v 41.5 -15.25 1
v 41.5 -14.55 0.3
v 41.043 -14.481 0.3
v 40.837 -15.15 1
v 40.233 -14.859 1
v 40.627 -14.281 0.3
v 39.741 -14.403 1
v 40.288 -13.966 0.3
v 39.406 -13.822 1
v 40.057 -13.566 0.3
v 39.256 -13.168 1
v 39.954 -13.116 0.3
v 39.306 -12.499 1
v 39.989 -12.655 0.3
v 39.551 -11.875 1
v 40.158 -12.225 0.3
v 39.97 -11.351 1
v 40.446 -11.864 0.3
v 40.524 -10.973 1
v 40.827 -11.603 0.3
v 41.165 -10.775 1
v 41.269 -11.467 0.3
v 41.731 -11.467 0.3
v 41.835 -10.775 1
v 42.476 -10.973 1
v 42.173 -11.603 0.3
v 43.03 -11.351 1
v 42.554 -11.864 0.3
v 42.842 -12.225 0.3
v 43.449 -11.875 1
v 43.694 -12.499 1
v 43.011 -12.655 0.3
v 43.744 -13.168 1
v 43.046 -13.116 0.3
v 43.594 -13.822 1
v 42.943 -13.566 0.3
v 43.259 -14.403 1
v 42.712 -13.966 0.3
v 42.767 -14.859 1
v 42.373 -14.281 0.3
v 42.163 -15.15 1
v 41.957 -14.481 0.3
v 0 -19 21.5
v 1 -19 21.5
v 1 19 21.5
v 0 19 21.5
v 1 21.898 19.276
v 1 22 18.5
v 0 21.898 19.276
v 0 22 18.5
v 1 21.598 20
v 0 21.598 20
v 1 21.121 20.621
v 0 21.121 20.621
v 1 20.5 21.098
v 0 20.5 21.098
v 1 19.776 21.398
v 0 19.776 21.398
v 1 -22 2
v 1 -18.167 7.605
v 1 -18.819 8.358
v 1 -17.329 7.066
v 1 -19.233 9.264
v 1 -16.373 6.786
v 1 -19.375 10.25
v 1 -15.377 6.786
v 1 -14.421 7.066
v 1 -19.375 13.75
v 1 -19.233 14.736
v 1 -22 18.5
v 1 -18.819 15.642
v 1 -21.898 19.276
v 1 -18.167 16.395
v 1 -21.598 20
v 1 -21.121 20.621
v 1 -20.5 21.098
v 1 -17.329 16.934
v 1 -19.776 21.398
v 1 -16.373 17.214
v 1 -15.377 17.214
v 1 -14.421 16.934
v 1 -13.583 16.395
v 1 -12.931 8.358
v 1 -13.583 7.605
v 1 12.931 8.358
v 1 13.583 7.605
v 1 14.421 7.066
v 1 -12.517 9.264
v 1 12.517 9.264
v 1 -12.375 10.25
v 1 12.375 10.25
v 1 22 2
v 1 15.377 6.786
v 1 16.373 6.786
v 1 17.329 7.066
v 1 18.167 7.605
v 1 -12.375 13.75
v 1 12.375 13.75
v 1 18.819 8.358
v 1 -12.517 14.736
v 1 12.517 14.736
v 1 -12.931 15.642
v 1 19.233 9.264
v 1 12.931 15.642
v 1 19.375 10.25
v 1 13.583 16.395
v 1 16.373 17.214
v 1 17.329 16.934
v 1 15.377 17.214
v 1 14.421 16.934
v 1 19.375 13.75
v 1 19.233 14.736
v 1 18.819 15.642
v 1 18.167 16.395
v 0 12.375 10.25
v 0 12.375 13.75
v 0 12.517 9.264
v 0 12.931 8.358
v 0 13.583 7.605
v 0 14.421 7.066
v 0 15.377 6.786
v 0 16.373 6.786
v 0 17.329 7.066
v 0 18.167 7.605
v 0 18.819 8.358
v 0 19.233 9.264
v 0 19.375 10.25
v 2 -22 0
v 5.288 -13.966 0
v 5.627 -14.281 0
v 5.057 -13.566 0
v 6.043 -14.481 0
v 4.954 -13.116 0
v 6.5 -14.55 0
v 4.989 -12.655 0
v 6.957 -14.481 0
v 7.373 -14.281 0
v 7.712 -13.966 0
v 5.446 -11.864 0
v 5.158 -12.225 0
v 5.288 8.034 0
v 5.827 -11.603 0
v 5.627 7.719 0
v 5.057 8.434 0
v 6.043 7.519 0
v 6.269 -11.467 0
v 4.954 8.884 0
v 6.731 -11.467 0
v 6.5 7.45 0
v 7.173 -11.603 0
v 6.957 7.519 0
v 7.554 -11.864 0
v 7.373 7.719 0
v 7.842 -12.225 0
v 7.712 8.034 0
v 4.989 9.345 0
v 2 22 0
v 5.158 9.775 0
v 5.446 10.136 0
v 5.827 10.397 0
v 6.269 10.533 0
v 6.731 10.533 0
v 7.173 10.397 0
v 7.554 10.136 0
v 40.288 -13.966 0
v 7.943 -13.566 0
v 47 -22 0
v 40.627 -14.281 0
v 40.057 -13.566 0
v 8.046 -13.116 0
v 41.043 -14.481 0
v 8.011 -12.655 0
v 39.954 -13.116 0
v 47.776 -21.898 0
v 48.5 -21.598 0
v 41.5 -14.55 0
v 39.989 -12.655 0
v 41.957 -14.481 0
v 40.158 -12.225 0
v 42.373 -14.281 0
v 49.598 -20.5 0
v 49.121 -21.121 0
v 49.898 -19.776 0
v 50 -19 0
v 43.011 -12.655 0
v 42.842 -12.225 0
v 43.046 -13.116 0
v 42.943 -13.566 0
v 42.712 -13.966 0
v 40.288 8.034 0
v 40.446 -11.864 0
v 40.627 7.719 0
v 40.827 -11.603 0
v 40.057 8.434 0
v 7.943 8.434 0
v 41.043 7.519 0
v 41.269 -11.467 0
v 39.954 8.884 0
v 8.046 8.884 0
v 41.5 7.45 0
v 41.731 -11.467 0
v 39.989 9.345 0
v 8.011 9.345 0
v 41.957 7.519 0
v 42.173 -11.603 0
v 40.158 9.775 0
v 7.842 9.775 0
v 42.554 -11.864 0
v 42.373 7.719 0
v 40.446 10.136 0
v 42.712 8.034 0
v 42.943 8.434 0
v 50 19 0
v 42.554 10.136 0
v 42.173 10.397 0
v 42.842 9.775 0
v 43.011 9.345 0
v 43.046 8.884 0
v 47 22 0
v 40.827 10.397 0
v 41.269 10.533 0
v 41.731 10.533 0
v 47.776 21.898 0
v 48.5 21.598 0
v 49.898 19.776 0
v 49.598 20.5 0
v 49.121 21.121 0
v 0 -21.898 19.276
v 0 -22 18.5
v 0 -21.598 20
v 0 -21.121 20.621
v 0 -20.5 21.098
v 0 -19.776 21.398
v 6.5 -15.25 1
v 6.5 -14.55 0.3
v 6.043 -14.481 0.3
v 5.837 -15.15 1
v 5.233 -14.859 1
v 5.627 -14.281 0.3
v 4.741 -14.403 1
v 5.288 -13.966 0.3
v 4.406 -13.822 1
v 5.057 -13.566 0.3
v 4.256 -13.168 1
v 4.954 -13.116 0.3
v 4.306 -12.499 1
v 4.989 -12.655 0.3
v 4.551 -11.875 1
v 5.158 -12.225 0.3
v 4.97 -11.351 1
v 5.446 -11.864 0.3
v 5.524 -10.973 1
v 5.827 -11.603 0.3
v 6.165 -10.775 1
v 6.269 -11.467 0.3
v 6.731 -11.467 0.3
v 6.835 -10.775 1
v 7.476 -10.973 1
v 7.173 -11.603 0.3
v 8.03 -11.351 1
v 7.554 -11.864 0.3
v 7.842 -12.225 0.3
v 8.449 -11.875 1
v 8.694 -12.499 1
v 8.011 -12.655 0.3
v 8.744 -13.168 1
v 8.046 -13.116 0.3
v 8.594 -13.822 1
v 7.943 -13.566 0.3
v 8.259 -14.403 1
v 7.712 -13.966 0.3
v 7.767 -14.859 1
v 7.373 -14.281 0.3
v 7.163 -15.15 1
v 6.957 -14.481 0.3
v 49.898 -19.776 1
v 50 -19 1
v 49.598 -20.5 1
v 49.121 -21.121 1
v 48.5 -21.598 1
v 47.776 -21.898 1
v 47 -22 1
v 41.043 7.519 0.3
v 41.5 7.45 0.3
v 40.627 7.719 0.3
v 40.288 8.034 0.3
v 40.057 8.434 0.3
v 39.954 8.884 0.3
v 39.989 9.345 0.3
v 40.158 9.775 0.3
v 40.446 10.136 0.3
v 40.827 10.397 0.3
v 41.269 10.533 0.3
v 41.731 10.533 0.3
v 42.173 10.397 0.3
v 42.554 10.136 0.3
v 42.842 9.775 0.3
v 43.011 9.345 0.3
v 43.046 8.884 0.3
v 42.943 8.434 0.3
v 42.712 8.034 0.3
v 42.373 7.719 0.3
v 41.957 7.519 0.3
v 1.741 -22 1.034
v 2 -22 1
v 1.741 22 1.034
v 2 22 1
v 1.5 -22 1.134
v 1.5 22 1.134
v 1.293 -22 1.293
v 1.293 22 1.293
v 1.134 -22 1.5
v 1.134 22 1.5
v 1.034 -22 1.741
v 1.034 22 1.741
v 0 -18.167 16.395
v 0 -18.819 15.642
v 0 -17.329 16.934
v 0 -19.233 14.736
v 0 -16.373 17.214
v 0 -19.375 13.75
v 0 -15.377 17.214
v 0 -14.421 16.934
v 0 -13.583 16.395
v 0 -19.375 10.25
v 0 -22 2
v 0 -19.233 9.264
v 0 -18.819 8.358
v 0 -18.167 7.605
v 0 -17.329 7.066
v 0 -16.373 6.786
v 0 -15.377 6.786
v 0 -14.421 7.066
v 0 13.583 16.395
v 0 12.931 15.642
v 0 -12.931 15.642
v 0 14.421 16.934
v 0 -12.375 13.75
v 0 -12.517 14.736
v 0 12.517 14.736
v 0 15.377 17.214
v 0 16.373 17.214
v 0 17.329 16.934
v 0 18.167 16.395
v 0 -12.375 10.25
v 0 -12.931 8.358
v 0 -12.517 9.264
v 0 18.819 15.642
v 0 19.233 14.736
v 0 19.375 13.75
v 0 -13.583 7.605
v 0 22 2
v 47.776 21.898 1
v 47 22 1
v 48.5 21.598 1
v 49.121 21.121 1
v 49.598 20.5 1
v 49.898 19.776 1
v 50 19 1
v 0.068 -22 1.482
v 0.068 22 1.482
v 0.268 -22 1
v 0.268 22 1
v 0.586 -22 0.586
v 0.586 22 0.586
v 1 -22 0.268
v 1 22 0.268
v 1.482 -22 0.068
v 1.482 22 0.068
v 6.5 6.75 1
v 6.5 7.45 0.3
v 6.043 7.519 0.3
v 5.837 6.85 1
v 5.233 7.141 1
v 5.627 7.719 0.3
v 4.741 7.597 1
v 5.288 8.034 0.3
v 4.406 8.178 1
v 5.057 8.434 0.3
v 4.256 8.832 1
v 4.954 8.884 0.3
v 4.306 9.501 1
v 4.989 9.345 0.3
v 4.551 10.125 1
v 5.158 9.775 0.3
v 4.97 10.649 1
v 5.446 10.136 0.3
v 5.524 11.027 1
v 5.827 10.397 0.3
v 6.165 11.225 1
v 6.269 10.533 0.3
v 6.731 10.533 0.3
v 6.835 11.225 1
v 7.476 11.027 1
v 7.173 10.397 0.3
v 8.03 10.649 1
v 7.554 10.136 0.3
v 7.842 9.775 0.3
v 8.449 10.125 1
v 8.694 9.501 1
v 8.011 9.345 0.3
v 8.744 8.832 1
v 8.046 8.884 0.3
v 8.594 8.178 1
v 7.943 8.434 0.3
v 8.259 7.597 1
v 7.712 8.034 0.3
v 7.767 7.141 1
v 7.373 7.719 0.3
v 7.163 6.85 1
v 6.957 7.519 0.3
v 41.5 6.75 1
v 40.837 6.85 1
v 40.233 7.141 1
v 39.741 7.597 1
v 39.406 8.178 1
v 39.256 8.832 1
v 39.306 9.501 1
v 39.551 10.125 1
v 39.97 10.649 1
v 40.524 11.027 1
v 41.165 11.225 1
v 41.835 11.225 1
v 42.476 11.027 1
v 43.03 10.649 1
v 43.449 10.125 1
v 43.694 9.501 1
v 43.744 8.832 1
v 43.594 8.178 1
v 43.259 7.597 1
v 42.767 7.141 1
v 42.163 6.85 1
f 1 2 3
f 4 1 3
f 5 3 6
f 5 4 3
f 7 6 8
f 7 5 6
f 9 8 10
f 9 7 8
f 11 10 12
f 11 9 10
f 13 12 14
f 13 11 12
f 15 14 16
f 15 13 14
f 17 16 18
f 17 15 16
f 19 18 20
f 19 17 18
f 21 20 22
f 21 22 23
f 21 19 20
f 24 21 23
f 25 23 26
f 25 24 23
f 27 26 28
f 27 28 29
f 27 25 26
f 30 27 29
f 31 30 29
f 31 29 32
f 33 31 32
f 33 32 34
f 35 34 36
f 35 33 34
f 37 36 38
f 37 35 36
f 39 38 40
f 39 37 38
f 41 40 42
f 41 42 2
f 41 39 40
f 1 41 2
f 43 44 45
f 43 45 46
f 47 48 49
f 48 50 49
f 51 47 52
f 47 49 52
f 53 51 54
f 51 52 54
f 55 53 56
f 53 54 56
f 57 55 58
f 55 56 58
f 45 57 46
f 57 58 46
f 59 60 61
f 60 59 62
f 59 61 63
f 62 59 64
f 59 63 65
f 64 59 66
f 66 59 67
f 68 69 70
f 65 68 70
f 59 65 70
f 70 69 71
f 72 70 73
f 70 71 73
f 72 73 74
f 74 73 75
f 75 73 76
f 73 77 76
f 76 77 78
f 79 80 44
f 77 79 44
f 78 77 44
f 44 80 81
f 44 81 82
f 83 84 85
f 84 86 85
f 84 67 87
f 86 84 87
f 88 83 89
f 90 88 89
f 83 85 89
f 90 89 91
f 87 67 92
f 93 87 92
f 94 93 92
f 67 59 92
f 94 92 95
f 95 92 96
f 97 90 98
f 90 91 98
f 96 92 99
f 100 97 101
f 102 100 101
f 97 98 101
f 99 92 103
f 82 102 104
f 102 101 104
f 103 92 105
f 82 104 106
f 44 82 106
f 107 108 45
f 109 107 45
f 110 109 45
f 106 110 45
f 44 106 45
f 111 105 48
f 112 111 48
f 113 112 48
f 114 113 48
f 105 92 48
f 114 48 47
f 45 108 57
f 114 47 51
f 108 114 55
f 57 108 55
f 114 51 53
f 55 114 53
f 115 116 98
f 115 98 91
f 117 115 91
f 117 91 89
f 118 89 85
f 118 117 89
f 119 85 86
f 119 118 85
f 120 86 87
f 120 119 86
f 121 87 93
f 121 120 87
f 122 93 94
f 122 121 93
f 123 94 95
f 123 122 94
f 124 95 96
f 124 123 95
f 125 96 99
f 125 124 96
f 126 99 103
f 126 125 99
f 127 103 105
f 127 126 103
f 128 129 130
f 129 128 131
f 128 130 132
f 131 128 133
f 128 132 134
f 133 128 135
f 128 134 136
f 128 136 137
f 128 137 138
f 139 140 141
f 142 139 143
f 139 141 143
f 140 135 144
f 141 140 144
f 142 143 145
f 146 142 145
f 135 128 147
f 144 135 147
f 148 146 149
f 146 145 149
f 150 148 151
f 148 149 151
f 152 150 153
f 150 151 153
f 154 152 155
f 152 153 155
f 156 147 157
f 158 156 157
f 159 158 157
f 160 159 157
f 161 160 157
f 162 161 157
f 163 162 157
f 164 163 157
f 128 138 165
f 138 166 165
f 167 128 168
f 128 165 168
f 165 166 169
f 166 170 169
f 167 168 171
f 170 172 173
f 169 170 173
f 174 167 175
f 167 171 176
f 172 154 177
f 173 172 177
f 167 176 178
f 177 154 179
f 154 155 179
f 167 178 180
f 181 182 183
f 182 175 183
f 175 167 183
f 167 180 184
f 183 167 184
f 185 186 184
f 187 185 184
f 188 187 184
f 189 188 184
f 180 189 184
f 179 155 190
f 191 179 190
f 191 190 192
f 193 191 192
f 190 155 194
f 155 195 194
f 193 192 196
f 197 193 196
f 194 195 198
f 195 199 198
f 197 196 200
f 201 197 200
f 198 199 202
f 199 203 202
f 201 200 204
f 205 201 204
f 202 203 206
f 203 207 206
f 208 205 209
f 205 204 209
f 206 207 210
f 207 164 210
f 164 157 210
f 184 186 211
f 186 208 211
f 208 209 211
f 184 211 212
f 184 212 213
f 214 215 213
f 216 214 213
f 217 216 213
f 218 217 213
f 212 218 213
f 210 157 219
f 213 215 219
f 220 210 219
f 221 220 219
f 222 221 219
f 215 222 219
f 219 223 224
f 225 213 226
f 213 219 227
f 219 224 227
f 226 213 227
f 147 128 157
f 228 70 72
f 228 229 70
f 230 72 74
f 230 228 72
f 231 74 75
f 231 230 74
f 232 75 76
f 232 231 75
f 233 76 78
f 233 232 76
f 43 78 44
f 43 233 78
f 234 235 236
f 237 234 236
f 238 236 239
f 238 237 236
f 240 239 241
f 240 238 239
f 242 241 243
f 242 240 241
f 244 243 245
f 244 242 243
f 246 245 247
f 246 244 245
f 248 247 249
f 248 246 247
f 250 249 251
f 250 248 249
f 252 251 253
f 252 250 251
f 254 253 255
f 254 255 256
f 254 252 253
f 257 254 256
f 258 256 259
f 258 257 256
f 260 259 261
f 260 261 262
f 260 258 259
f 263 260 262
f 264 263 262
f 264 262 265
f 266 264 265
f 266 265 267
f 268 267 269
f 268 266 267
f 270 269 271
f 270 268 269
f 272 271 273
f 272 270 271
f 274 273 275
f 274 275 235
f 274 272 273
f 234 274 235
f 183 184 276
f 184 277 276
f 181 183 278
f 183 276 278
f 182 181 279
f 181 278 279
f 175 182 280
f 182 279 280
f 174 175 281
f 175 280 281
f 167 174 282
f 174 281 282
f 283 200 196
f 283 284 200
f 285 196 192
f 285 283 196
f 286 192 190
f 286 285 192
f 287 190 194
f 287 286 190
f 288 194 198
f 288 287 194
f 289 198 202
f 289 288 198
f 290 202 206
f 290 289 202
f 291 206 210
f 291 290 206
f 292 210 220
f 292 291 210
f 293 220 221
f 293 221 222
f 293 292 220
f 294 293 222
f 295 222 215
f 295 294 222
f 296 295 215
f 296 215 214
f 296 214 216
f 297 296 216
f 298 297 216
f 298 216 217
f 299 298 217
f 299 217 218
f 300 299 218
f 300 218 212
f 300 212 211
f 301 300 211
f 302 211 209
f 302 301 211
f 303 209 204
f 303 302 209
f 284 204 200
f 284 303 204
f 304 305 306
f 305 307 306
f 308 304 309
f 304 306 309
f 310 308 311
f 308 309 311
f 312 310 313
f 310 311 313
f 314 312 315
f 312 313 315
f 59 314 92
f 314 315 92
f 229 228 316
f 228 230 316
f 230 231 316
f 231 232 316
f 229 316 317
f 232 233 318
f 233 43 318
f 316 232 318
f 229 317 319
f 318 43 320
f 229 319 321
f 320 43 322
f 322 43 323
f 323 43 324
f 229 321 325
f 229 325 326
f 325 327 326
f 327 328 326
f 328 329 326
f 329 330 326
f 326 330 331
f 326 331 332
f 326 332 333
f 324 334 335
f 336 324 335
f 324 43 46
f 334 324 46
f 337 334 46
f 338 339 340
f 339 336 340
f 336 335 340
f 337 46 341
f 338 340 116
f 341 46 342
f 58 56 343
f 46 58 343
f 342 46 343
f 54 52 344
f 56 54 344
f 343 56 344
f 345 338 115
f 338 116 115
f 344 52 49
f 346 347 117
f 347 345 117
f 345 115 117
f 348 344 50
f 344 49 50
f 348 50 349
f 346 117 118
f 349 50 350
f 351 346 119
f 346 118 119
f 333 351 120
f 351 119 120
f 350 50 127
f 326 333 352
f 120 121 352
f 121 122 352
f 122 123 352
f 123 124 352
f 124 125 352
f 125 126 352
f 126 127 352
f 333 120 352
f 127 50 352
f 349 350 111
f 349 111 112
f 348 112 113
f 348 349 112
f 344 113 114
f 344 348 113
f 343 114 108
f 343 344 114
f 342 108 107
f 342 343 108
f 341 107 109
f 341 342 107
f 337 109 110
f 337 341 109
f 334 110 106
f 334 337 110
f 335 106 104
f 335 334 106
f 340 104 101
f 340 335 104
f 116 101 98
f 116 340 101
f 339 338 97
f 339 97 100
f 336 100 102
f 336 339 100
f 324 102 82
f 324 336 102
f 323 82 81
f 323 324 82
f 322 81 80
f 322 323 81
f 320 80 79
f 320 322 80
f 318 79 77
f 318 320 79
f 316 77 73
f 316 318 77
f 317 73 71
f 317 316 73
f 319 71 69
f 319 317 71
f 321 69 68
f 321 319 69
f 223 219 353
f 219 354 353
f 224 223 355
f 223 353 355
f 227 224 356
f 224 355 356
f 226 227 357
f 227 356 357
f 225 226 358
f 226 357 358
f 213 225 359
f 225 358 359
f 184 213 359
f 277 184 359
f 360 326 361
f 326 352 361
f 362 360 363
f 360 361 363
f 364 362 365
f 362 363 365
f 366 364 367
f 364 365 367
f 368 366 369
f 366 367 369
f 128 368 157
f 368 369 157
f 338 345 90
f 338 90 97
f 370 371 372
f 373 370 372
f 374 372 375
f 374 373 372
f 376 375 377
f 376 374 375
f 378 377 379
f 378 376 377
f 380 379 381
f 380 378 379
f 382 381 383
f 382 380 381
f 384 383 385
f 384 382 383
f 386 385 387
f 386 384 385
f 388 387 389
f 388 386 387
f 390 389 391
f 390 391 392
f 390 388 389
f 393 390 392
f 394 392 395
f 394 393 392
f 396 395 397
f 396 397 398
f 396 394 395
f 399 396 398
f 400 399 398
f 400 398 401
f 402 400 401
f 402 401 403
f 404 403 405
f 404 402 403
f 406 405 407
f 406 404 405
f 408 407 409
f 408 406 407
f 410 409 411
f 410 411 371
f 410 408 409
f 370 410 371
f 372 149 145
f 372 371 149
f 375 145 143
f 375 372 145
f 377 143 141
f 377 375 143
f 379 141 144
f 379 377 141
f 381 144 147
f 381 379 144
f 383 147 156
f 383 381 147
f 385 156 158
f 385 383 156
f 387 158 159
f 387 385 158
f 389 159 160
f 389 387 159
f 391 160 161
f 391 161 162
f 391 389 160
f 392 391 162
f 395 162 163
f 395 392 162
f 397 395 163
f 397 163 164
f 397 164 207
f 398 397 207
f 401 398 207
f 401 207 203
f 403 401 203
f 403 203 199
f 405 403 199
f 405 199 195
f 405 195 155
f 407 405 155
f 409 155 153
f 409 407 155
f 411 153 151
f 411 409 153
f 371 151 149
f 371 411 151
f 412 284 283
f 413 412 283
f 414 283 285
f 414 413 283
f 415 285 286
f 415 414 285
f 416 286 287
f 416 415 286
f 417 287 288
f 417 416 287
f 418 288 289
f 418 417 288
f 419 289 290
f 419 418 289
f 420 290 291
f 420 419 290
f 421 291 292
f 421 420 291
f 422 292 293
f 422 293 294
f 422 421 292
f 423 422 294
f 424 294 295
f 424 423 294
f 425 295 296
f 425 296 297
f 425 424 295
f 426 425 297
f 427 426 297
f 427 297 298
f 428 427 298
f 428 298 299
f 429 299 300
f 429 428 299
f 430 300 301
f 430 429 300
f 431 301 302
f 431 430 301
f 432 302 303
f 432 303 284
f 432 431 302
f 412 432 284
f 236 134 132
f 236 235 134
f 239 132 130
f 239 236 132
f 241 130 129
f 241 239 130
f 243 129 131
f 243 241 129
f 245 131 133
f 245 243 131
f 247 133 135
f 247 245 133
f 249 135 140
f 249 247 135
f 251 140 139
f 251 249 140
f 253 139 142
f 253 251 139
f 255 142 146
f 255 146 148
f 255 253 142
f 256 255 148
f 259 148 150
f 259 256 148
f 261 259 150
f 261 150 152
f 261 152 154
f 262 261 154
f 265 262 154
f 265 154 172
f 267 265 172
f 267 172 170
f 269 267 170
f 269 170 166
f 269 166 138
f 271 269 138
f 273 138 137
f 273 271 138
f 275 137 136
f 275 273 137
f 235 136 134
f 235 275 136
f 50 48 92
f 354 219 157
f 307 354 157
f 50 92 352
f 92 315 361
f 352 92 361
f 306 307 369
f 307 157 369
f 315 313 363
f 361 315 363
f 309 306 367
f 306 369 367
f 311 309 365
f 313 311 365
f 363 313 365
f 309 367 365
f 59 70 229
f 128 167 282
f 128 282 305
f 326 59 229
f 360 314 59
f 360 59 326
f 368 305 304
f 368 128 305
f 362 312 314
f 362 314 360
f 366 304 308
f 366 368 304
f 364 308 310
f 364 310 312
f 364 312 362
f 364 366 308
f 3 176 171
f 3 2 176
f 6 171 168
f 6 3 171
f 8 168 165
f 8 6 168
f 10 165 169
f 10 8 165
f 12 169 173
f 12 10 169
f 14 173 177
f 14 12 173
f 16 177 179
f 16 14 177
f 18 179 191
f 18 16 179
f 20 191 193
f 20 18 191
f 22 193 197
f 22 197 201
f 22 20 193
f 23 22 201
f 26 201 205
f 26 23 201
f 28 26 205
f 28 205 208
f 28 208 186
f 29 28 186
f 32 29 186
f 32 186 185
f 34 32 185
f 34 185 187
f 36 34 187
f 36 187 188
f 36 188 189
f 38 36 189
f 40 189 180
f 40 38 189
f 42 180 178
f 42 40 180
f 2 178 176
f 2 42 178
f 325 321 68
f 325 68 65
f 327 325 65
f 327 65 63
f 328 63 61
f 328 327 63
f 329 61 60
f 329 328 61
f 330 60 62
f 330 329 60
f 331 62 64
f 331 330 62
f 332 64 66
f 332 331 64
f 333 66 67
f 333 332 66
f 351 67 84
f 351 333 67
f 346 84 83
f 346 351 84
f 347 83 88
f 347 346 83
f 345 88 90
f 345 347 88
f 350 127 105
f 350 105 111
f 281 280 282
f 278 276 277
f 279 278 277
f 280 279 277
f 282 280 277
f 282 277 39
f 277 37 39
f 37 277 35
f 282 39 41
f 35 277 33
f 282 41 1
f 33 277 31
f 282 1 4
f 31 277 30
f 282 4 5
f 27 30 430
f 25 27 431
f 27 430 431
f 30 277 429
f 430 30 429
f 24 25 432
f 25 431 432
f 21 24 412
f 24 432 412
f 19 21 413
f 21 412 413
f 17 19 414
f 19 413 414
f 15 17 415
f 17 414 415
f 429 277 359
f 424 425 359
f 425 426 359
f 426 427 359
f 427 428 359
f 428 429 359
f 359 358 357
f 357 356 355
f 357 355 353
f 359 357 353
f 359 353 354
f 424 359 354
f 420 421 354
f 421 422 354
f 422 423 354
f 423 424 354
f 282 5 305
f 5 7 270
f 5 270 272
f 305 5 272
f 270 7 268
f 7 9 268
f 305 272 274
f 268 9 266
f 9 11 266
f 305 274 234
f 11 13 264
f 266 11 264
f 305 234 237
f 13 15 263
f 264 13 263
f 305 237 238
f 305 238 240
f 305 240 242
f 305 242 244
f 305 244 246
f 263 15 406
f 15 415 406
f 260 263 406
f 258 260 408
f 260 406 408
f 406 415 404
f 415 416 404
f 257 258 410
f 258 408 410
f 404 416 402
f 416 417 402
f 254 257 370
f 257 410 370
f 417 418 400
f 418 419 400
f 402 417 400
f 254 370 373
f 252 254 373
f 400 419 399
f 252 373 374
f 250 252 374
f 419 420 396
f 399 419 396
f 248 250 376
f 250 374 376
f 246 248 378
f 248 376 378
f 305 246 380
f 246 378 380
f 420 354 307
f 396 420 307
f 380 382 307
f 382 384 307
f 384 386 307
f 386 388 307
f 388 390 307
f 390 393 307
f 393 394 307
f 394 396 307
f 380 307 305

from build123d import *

# Parameters (mm, degrees)
SM_BASE_FLANGE_1_DEPTH           = 22
FILLET_1_R                       = 3
HOLE_WIZARD_6_8_6_8_1_DEPTH      = 1
HOLE_WIZARD_3_1_3_1_1_AT_2_COUNT = 2
HOLE_WIZARD_3_1_3_1_1_AT_2_PITCH = 41.340053217
HOLE_WIZARD_3_1_3_1_1_AT_3_COUNT = 2
HOLE_WIZARD_3_1_3_1_1_AT_3_PITCH = 22
HOLE_WIZARD_3_1_3_1_1_AT_4_COUNT = 2
HOLE_WIZARD_3_1_3_1_1_AT_4_PITCH = 35


# Read off the part's stored shape, not the designer's step: Диаметр отверстия Ø6.8 (6.8)1
# Sheet-metal steps are written as plain solids
with BuildPart() as part:
    # Sketch 1 → Базовая кромка1 (new, symmetric)
    with BuildSketch(Plane(origin=(0, 0, 0), x_dir=(1, 0, 0), z_dir=(0, 1, 0))):
        with BuildLine():
            Line((0, -21.5), (0, -2))
            ThreePointArc((0, -2), (0.585786438, -0.585786438), (2, 0))
            Line((2, 0), (50, 0))
            Line((50, 0), (50, -1))
            Line((50, -1), (2, -1))
            ThreePointArc((2, -1), (1.292893219, -1.292893219), (1, -2))
            Line((1, -2), (1, -21.5))
            Line((1, -21.5), (0, -21.5))
        make_face()
    extrude(amount=SM_BASE_FLANGE_1_DEPTH, both=True)

    # Скругление1
    fillet_1_edges = [part.edges().sort_by_distance(p)[0] for p in [
        (0.5, 22, 21.5),
        (0.5, -22, 21.5),
        (50, 22, 0.5),
        (50, -22, 0.5),
    ]]
    fillet(fillet_1_edges, radius=FILLET_1_R)

    # Диаметр отверстия Ø6.8 (6.8)1 outline → Диаметр отверстия Ø6.8 (6.8)1 (cut)
    with BuildSketch(Plane.YZ):
        with BuildLine():
            Line((-12.375, 10.25), (-12.375, 13.75))
            ThreePointArc((-12.375, 13.75), (-15.875, 17.25), (-19.375, 13.75))
            Line((-19.375, 13.75), (-19.375, 10.25))
            ThreePointArc((-19.375, 10.25), (-15.875, 6.75), (-12.375, 10.25))
        make_face()
        with BuildLine():
            ThreePointArc((19.375, 13.75), (15.875, 17.25), (12.375, 13.75))
            Line((12.375, 13.75), (12.375, 10.25))
            ThreePointArc((12.375, 10.25), (15.875, 6.75), (19.375, 10.25))
            Line((19.375, 10.25), (19.375, 13.75))
        make_face()
    extrude(amount=HOLE_WIZARD_6_8_6_8_1_DEPTH, mode=Mode.SUBTRACT)

    # Эскиз5 → Диаметр отверстия Ø3.1 (3.1)1 (revolve, cut)
    with BuildSketch(Plane(origin=(6.5, 9, 1), x_dir=(0, -1, 0), z_dir=(1, 0, 0))):
        Polygon((0, 0), (0, 1), (1.55, 1), (1.55, 0.7), (2.25, 0), align=None)
    hole_wizard_3_1_3_1_1 = revolve(axis=Axis((6.5, 9, 7.35), (0, 0, -1)), mode=Mode.SUBTRACT)

    # Диаметр отверстия Ø3.1 (3.1)1 at 2: Диаметр отверстия Ø3.1 (3.1)1 ×2
    with Locations(*[Vector(0.8466365492110047, -0.5321715452183459, 0) * (i * HOLE_WIZARD_3_1_3_1_1_AT_2_PITCH) for i in range(1, HOLE_WIZARD_3_1_3_1_1_AT_2_COUNT)]):
        add(hole_wizard_3_1_3_1_1, mode=Mode.SUBTRACT)

    # Диаметр отверстия Ø3.1 (3.1)1 at 3: Диаметр отверстия Ø3.1 (3.1)1 ×2
    with Locations(*[(0, -i * HOLE_WIZARD_3_1_3_1_1_AT_3_PITCH, 0) for i in range(1, HOLE_WIZARD_3_1_3_1_1_AT_3_COUNT)]):
        add(hole_wizard_3_1_3_1_1, mode=Mode.SUBTRACT)

    # Диаметр отверстия Ø3.1 (3.1)1 at 4: Диаметр отверстия Ø3.1 (3.1)1 ×2
    with Locations(*[(i * HOLE_WIZARD_3_1_3_1_1_AT_4_PITCH, 0, 0) for i in range(1, HOLE_WIZARD_3_1_3_1_1_AT_4_COUNT)]):
        add(hole_wizard_3_1_3_1_1, mode=Mode.SUBTRACT)


solid = part.part
